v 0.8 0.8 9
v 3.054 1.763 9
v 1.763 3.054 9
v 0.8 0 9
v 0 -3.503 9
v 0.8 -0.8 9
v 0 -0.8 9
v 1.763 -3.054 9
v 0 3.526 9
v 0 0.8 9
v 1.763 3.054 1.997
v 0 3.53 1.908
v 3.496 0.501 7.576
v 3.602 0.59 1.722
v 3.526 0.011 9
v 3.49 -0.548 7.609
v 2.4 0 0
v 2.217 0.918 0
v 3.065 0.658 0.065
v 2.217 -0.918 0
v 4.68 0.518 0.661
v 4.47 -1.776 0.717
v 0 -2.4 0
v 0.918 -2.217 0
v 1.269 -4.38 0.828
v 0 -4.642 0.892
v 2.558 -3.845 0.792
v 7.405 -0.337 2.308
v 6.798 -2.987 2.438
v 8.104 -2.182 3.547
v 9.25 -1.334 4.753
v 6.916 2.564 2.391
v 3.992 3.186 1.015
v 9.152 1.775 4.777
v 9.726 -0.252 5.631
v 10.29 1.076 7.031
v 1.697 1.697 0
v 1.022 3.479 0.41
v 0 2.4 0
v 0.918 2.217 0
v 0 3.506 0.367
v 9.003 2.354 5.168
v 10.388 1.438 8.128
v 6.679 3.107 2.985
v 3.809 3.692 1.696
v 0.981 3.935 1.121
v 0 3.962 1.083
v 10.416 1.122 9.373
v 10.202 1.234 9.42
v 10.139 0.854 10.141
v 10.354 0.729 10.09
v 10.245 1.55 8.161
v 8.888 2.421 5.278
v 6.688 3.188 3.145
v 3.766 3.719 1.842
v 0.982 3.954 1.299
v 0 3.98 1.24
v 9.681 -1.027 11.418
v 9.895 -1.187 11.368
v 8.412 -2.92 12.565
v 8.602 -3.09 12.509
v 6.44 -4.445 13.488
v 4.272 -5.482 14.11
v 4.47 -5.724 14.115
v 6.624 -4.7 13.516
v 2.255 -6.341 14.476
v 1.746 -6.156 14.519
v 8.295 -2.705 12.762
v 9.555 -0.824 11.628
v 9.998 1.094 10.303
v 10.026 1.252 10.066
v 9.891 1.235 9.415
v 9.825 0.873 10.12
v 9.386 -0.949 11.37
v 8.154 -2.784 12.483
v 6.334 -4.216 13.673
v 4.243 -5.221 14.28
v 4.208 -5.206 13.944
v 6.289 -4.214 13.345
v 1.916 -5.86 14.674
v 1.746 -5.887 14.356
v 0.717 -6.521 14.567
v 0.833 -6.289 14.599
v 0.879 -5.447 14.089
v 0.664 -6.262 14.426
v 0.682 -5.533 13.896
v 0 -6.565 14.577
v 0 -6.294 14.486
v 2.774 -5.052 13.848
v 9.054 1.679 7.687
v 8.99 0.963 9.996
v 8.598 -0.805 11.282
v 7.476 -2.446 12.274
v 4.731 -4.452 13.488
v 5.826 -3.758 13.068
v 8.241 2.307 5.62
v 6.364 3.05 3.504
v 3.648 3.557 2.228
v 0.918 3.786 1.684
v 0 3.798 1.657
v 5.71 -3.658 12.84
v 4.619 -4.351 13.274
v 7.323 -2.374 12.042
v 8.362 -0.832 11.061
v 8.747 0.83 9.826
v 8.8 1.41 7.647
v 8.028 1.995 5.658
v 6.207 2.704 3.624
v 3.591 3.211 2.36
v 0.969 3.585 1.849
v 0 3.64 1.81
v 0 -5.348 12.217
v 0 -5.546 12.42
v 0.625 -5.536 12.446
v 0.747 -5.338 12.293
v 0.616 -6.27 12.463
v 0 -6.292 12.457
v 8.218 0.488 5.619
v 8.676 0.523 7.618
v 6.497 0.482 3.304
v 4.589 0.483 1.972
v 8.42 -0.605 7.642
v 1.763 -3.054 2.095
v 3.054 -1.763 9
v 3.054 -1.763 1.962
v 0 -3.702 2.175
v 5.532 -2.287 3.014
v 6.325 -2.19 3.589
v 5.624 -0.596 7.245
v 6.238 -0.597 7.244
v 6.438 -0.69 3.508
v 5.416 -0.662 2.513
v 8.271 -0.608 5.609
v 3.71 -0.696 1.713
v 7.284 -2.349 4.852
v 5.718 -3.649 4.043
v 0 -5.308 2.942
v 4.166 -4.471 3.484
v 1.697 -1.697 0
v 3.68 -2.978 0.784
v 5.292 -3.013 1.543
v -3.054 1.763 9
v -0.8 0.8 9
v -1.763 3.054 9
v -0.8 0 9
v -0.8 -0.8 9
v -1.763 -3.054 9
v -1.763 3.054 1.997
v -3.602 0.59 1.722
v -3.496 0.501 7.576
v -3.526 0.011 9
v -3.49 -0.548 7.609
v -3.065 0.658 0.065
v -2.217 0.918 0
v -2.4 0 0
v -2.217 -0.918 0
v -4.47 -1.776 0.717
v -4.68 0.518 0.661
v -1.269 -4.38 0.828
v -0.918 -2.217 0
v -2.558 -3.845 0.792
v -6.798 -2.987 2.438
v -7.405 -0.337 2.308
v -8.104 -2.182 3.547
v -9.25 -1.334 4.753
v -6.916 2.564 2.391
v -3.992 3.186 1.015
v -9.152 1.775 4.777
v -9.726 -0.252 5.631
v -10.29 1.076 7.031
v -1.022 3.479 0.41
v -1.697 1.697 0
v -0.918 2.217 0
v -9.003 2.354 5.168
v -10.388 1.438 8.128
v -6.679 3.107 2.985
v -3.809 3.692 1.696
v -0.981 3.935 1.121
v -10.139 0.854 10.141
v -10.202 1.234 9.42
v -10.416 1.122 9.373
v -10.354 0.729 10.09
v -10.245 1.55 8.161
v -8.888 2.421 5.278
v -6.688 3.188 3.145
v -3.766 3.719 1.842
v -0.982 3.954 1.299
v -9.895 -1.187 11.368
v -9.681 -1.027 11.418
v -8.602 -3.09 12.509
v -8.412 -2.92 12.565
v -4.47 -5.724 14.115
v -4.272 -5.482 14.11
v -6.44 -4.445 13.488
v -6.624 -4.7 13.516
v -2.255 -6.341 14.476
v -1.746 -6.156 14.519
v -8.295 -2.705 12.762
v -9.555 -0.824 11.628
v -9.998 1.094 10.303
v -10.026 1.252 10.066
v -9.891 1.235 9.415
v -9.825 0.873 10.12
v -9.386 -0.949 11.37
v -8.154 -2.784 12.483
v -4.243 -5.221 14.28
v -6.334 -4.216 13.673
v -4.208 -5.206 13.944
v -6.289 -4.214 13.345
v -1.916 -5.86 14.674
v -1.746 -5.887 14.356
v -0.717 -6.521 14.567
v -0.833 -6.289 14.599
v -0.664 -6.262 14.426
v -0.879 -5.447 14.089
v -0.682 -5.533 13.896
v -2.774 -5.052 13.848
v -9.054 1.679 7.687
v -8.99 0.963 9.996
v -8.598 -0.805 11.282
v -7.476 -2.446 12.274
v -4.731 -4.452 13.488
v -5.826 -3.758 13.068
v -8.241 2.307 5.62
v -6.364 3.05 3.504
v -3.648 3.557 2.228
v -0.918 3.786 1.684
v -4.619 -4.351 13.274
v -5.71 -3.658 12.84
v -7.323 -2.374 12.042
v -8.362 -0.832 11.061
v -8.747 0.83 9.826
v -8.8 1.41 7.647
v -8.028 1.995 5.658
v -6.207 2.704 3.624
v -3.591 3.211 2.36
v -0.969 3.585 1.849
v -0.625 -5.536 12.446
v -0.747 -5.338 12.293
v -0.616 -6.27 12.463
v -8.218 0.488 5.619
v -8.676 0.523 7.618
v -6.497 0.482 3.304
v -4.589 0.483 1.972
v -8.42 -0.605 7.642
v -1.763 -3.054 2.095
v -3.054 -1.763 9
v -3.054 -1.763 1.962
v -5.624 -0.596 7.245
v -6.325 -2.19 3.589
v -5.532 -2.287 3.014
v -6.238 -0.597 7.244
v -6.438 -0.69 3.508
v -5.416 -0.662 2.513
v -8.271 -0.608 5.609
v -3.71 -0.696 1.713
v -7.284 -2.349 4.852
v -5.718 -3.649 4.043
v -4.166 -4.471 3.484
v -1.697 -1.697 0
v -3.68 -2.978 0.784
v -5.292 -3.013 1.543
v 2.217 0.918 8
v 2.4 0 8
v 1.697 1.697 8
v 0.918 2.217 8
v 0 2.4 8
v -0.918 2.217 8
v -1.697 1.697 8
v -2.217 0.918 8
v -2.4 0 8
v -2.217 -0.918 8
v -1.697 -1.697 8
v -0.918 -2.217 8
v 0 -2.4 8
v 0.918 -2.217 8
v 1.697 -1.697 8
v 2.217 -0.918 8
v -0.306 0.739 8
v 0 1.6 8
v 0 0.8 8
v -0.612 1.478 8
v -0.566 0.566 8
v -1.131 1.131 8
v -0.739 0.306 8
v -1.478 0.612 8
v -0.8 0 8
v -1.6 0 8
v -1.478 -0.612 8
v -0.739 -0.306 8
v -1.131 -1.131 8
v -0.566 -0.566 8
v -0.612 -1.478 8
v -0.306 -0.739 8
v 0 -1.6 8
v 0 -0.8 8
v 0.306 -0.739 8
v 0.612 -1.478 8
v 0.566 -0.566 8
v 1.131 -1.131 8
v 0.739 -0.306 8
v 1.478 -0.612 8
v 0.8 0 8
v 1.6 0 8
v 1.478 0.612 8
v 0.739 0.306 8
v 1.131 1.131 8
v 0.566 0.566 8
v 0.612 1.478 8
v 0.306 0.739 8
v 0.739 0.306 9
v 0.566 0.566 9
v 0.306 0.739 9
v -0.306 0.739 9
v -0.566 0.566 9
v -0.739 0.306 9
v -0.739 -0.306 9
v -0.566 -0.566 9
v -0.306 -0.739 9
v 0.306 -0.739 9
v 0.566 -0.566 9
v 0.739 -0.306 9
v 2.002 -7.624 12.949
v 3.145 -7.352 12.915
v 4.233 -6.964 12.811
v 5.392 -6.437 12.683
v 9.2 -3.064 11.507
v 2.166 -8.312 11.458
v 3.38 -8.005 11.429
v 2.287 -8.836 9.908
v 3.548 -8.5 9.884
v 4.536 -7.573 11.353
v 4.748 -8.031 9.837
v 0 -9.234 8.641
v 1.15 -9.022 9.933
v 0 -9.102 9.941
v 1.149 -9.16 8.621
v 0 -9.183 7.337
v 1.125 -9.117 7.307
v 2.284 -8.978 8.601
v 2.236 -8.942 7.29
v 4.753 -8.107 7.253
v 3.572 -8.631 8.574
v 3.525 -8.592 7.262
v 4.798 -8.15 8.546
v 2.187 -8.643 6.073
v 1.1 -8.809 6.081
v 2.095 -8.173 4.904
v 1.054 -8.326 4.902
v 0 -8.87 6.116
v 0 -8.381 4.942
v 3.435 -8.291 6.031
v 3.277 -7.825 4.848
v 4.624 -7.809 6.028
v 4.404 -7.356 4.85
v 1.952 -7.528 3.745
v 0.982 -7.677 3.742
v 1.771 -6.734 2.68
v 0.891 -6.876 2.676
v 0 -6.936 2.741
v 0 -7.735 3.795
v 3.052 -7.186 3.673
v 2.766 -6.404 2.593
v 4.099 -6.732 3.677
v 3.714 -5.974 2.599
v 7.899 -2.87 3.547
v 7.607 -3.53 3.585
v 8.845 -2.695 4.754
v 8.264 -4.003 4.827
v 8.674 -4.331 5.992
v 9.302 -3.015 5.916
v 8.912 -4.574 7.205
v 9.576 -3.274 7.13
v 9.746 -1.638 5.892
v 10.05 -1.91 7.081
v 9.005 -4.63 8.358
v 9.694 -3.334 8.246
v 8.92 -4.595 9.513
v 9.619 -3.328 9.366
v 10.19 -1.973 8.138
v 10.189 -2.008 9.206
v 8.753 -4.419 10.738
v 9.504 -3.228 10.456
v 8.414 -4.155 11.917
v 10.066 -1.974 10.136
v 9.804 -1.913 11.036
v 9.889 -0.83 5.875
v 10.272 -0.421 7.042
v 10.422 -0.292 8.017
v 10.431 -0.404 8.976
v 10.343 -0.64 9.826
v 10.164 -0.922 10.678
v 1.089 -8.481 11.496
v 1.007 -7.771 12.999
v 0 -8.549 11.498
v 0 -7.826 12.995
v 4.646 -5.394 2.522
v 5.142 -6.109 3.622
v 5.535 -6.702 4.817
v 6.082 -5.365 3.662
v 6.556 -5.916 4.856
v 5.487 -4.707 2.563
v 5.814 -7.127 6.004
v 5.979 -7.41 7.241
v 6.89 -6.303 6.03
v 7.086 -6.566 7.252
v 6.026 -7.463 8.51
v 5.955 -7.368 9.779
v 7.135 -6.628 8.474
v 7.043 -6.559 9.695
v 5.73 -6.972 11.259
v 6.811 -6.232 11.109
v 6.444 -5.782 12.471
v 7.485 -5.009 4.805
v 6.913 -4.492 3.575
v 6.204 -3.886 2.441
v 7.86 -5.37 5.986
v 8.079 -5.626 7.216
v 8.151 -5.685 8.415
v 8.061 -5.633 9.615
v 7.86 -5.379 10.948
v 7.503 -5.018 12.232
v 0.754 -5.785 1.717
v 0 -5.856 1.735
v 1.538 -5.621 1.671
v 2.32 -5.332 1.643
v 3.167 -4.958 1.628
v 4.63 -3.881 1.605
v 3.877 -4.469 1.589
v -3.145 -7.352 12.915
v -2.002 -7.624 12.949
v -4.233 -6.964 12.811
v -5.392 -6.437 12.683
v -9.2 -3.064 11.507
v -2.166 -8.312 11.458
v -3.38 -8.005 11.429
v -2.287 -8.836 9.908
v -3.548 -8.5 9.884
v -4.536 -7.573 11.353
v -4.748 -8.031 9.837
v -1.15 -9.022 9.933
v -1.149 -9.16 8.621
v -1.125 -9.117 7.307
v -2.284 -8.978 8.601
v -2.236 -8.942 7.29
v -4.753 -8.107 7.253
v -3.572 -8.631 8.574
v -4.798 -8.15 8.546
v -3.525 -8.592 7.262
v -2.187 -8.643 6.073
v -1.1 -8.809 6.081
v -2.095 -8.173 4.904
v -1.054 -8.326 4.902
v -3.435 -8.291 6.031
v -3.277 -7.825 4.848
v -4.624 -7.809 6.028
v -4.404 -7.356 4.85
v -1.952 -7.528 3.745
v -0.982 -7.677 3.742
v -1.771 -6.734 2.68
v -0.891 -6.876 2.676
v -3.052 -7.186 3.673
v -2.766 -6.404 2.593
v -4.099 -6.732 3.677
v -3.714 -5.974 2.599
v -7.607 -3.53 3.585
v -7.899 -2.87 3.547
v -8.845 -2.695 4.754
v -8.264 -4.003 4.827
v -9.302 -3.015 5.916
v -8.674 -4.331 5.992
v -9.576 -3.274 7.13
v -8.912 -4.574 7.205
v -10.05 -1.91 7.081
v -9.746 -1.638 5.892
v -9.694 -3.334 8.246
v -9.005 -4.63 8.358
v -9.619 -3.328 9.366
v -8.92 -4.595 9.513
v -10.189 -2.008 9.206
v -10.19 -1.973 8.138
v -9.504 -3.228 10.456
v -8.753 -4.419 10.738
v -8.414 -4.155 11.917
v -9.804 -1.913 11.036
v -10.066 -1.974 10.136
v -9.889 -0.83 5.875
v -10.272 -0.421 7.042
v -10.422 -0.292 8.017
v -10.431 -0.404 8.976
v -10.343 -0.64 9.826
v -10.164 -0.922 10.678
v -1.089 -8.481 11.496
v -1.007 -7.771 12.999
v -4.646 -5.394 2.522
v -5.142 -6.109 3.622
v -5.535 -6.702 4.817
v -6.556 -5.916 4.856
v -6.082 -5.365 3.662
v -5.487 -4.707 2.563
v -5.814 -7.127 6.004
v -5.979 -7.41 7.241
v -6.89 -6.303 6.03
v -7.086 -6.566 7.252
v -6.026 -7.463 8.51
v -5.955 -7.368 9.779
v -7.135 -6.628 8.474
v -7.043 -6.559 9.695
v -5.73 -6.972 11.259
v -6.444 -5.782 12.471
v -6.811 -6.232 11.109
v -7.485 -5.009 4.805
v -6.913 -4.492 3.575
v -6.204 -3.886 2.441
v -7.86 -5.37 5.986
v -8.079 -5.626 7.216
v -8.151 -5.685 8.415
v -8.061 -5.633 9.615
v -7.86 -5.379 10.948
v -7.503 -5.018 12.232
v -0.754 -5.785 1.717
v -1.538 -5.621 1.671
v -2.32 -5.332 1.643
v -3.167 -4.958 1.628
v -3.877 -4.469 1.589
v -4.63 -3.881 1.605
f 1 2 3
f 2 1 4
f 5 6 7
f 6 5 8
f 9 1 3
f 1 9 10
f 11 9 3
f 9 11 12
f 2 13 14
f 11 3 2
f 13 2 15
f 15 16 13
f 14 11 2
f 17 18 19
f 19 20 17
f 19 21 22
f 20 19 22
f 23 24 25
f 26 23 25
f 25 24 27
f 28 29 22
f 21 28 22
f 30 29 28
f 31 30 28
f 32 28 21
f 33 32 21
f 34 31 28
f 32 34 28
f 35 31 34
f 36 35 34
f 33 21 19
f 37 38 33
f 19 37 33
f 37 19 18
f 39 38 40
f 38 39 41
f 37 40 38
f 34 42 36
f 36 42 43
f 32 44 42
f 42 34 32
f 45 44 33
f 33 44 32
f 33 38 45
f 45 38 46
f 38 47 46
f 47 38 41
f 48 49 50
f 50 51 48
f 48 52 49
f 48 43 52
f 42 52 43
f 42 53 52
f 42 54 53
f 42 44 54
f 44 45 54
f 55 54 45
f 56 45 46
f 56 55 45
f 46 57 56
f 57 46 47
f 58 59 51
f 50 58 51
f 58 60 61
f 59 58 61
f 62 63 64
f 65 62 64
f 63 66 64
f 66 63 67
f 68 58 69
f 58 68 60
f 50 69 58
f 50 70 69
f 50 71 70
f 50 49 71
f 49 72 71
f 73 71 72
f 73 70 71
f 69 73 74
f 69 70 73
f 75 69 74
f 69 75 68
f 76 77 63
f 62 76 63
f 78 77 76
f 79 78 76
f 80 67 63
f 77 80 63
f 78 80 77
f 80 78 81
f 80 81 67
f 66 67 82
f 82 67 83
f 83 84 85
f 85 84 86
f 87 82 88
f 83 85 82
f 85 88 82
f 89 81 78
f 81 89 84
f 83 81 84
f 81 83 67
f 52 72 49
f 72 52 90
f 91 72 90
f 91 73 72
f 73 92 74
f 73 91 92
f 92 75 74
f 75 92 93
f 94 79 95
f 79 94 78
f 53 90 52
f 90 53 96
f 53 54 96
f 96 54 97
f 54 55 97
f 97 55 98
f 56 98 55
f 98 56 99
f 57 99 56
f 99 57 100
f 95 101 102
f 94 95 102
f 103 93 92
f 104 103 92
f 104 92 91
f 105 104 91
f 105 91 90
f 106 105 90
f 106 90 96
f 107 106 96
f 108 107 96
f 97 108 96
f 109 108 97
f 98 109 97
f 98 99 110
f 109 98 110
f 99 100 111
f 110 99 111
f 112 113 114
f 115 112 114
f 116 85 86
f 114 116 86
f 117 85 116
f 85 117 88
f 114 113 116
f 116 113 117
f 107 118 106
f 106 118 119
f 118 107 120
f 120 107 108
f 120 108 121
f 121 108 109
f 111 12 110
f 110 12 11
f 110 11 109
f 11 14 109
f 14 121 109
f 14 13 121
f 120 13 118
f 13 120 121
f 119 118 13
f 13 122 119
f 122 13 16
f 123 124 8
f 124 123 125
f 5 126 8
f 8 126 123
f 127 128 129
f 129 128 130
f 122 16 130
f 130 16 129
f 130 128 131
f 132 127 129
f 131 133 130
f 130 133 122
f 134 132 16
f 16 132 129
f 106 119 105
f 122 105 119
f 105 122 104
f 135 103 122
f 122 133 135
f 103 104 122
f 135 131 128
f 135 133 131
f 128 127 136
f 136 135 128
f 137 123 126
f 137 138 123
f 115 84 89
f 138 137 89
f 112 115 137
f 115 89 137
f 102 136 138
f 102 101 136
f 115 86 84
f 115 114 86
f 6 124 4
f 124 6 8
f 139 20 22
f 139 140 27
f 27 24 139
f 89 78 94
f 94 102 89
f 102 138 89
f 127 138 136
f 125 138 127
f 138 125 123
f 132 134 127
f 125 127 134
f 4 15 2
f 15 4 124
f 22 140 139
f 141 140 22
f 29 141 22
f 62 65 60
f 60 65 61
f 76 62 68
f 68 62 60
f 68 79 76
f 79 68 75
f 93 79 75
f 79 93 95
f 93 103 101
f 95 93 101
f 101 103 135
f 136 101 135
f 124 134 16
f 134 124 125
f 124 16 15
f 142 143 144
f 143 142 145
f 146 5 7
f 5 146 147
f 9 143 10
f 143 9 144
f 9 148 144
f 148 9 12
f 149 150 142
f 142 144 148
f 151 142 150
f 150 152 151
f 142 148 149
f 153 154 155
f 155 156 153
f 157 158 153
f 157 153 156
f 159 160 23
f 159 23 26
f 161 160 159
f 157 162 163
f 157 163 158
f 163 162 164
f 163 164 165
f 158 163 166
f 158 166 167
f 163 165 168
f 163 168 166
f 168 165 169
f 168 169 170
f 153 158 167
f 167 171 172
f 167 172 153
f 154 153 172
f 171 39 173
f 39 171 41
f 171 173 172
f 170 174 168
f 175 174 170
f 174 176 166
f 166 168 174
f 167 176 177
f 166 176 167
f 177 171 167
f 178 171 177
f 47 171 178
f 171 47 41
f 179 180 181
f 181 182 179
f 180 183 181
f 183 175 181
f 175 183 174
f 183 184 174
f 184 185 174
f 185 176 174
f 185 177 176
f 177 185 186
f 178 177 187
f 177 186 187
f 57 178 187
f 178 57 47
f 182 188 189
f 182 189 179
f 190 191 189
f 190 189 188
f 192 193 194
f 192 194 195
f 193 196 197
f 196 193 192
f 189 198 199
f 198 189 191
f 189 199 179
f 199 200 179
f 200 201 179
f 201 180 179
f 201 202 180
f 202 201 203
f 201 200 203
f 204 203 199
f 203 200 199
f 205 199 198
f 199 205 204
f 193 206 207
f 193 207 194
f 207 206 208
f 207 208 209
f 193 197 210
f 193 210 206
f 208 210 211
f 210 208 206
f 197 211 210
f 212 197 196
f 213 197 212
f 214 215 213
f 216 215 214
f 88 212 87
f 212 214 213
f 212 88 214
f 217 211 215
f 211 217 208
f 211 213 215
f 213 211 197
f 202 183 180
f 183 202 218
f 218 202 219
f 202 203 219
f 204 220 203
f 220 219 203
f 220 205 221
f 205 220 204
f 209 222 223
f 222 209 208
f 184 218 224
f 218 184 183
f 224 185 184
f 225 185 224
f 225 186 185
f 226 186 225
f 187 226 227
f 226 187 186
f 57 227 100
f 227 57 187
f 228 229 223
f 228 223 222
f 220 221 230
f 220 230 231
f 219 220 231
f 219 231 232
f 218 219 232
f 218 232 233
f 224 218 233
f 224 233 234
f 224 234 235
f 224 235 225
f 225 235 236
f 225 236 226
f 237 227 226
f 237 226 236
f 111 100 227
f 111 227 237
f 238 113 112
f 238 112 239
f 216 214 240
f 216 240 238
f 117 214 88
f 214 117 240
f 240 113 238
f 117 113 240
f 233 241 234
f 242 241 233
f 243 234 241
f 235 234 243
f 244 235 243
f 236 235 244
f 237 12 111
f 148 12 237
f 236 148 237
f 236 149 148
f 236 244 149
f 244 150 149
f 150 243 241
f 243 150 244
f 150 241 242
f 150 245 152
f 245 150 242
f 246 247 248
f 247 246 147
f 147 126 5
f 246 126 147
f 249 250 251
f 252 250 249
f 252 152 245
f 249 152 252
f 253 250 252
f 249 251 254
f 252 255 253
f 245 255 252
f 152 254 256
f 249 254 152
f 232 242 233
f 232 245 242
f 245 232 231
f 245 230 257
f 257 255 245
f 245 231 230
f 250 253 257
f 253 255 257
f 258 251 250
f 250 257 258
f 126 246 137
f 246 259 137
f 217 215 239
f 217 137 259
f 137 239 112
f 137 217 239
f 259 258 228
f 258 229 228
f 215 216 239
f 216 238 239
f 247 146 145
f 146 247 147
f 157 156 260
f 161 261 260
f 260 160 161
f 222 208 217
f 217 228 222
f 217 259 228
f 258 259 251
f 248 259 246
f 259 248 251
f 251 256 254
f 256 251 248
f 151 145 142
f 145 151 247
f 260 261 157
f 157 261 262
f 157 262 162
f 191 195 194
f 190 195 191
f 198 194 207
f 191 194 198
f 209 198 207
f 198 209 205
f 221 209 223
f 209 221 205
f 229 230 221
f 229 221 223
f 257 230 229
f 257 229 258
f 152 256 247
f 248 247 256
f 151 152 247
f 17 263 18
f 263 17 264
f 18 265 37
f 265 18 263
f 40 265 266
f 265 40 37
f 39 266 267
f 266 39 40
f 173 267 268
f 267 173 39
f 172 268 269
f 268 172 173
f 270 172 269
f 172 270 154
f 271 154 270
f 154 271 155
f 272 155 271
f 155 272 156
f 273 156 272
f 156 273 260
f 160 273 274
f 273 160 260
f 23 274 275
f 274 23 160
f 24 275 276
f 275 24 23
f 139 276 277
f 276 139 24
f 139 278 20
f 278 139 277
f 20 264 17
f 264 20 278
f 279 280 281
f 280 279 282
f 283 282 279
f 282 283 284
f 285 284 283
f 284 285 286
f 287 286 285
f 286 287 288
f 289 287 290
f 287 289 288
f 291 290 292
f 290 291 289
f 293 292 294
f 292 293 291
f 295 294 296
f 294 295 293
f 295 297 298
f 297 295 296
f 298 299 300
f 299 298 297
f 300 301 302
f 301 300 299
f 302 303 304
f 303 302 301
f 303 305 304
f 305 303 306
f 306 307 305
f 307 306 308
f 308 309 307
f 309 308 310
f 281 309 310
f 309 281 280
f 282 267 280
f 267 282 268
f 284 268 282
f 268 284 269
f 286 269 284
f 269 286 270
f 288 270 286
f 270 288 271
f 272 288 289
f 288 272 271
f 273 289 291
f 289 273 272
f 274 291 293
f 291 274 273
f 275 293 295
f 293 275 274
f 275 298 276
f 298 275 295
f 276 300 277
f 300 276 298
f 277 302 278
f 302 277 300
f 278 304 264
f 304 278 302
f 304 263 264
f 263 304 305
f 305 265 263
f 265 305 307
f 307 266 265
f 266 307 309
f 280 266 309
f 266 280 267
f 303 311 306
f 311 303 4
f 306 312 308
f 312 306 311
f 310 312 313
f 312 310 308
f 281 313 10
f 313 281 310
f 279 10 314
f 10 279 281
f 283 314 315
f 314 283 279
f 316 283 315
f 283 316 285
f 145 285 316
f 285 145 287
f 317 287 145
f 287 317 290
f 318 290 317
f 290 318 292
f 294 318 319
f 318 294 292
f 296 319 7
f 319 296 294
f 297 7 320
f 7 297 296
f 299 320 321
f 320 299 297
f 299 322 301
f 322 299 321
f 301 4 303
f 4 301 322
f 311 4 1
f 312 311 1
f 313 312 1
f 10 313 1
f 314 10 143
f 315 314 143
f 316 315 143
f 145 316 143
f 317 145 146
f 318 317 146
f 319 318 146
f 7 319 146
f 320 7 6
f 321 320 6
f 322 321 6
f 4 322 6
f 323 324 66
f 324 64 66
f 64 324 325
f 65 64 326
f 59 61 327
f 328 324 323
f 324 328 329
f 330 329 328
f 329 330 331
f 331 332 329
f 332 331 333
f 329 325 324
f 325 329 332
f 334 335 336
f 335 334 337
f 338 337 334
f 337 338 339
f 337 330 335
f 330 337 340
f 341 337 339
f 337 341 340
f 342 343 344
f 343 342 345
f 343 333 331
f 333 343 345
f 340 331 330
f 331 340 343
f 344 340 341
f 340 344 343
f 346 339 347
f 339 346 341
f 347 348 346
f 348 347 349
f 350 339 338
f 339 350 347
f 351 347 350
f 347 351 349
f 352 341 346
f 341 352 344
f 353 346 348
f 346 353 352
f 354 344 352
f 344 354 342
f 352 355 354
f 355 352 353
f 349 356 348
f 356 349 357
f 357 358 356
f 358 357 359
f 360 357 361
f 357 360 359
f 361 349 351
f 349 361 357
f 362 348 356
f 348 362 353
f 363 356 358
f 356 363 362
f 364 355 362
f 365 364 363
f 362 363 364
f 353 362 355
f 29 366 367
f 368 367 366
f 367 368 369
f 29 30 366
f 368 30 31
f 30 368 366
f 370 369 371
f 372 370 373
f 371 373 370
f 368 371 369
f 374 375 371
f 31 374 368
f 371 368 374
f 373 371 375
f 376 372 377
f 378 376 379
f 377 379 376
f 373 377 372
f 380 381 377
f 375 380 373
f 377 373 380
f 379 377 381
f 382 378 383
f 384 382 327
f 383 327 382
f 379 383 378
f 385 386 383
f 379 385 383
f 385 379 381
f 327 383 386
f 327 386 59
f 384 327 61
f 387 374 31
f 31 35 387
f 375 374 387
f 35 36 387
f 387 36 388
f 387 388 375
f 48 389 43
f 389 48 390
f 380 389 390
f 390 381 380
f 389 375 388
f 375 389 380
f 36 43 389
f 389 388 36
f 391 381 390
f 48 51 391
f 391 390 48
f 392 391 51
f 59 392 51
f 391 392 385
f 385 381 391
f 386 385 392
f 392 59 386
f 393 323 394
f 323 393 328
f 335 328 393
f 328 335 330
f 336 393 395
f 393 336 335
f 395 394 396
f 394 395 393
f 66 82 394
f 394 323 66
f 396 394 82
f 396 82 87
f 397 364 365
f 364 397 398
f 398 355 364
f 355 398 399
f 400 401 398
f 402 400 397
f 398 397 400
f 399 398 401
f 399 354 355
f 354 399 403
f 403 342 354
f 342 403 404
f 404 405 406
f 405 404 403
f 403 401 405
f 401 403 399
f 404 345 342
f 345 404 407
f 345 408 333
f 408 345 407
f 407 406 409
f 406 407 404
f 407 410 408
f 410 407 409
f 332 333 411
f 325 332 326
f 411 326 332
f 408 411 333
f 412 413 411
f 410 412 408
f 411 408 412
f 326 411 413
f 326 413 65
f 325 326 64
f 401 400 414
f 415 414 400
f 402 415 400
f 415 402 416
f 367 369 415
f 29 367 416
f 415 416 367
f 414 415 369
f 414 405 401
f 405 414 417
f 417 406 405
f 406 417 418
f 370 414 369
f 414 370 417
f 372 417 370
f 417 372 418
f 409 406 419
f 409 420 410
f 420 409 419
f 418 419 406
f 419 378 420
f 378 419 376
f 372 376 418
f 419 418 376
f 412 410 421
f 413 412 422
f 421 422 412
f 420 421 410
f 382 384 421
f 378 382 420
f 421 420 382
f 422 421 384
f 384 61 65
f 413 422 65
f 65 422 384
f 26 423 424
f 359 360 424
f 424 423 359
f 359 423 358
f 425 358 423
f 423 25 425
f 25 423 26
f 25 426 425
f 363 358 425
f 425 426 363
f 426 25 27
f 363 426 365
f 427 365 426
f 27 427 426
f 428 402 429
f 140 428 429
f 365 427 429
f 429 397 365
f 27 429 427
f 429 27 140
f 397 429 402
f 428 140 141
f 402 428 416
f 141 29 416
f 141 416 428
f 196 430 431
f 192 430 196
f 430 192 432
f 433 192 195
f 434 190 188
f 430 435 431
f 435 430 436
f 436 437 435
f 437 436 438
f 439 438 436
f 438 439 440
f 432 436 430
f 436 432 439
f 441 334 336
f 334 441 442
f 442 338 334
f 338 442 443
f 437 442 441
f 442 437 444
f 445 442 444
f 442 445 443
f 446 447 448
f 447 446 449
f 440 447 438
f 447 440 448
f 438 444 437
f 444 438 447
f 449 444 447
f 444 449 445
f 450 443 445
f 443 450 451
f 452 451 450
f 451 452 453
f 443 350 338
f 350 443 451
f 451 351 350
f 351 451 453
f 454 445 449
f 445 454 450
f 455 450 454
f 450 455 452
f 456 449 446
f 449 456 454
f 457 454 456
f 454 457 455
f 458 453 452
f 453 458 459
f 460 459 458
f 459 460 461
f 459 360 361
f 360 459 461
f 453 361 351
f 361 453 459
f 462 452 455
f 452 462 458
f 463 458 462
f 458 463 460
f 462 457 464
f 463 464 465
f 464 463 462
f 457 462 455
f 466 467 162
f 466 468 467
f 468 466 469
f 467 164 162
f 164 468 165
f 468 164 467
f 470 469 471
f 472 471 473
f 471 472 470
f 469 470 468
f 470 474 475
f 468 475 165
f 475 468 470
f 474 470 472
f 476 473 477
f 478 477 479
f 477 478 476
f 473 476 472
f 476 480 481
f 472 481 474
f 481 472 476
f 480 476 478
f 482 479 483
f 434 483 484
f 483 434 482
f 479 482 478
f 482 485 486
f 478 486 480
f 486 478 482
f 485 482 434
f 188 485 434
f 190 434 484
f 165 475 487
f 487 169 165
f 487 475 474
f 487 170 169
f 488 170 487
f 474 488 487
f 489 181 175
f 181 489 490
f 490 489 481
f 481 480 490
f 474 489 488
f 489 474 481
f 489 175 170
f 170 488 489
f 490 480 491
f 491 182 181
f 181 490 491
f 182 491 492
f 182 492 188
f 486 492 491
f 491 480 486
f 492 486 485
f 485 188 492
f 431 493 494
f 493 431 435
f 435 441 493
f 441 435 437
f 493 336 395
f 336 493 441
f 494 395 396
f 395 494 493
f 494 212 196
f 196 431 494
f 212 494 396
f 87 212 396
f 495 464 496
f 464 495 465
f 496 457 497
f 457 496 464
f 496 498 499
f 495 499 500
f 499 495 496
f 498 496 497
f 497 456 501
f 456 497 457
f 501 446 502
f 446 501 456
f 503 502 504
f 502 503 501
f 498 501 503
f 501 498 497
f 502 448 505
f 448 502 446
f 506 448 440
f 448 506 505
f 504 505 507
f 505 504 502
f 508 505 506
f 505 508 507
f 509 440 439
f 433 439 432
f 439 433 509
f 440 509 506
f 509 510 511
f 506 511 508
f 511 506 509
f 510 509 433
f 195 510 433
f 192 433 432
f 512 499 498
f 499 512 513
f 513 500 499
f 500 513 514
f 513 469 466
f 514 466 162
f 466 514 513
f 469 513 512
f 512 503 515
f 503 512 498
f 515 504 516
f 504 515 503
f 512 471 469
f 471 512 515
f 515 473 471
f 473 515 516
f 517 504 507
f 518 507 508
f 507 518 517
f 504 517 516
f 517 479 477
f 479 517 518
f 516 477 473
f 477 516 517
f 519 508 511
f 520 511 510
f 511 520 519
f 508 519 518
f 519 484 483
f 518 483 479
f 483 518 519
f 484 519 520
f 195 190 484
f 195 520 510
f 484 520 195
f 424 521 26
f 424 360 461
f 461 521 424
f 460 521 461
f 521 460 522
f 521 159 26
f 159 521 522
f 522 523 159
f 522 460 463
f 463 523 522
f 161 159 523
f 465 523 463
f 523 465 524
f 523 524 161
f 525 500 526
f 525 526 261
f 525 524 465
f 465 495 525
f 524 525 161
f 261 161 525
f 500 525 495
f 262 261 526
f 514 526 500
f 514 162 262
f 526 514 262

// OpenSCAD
use <../lib.scad>
use <s/31512s01.scad>
use <s/31512s02.scad>
use <s/31512s04.scad>
function ldraw_lib__31512() = [
// 0 ~Minifig Head Powerpuff Girls Face
// 0 Name: 31512.dat
// 0 Author: Magnus Forsberg [MagFors]
// 0 !LDRAW_ORG Part UPDATE 2023-06
// 0 !LICENSE Licensed under CC BY 4.0 : see CAreadme.txt
// 
// 0 BFC CERTIFY CCW
  [0,"BFC","CERTIFY"],
  [0,"BFC","CCW"],
// 
// 0 !HISTORY 2023-11-19 [OrionP] Official Update 2023-06
// 
// 
// 1 16 0 0 0 1 0 0 0 1 0 0 0 1 s\31512s01.dat
  [1,16,0,0,0,1,0,0,0,1,0,0,0,1, ldraw_lib__s__31512s01()],
// 1 16 0 0 0 1 0 0 0 1 0 0 0 1 s\31512s02.dat
  [1,16,0,0,0,1,0,0,0,1,0,0,0,1, ldraw_lib__s__31512s02()],
// 1 16 0 0 0 -1 0 0 0 1 0 0 0 1 s\31512s02.dat
  [1,16,0,0,0,-1,0,0,0,1,0,0,0,1, ldraw_lib__s__31512s02()],
// 1 16 0 0 0 1 0 0 0 1 0 0 0 1 s\31512s04.dat
  [1,16,0,0,0,1,0,0,0,1,0,0,0,1, ldraw_lib__s__31512s04()],
// 1 16 0 0 0 -1 0 0 0 1 0 0 0 1 s\31512s04.dat
  [1,16,0,0,0,-1,0,0,0,1,0,0,0,1, ldraw_lib__s__31512s04()],
];
module ldraw_lib__31512(step=0, col=false, unit=2/5, alt=false, line=0.2, solid=!$preview)
    makepoly(ldraw_lib__31512(), step=step, col=col, unit=unit, alt=alt, line=line, solid=solid);
ldraw_lib__31512(line=0.2);
